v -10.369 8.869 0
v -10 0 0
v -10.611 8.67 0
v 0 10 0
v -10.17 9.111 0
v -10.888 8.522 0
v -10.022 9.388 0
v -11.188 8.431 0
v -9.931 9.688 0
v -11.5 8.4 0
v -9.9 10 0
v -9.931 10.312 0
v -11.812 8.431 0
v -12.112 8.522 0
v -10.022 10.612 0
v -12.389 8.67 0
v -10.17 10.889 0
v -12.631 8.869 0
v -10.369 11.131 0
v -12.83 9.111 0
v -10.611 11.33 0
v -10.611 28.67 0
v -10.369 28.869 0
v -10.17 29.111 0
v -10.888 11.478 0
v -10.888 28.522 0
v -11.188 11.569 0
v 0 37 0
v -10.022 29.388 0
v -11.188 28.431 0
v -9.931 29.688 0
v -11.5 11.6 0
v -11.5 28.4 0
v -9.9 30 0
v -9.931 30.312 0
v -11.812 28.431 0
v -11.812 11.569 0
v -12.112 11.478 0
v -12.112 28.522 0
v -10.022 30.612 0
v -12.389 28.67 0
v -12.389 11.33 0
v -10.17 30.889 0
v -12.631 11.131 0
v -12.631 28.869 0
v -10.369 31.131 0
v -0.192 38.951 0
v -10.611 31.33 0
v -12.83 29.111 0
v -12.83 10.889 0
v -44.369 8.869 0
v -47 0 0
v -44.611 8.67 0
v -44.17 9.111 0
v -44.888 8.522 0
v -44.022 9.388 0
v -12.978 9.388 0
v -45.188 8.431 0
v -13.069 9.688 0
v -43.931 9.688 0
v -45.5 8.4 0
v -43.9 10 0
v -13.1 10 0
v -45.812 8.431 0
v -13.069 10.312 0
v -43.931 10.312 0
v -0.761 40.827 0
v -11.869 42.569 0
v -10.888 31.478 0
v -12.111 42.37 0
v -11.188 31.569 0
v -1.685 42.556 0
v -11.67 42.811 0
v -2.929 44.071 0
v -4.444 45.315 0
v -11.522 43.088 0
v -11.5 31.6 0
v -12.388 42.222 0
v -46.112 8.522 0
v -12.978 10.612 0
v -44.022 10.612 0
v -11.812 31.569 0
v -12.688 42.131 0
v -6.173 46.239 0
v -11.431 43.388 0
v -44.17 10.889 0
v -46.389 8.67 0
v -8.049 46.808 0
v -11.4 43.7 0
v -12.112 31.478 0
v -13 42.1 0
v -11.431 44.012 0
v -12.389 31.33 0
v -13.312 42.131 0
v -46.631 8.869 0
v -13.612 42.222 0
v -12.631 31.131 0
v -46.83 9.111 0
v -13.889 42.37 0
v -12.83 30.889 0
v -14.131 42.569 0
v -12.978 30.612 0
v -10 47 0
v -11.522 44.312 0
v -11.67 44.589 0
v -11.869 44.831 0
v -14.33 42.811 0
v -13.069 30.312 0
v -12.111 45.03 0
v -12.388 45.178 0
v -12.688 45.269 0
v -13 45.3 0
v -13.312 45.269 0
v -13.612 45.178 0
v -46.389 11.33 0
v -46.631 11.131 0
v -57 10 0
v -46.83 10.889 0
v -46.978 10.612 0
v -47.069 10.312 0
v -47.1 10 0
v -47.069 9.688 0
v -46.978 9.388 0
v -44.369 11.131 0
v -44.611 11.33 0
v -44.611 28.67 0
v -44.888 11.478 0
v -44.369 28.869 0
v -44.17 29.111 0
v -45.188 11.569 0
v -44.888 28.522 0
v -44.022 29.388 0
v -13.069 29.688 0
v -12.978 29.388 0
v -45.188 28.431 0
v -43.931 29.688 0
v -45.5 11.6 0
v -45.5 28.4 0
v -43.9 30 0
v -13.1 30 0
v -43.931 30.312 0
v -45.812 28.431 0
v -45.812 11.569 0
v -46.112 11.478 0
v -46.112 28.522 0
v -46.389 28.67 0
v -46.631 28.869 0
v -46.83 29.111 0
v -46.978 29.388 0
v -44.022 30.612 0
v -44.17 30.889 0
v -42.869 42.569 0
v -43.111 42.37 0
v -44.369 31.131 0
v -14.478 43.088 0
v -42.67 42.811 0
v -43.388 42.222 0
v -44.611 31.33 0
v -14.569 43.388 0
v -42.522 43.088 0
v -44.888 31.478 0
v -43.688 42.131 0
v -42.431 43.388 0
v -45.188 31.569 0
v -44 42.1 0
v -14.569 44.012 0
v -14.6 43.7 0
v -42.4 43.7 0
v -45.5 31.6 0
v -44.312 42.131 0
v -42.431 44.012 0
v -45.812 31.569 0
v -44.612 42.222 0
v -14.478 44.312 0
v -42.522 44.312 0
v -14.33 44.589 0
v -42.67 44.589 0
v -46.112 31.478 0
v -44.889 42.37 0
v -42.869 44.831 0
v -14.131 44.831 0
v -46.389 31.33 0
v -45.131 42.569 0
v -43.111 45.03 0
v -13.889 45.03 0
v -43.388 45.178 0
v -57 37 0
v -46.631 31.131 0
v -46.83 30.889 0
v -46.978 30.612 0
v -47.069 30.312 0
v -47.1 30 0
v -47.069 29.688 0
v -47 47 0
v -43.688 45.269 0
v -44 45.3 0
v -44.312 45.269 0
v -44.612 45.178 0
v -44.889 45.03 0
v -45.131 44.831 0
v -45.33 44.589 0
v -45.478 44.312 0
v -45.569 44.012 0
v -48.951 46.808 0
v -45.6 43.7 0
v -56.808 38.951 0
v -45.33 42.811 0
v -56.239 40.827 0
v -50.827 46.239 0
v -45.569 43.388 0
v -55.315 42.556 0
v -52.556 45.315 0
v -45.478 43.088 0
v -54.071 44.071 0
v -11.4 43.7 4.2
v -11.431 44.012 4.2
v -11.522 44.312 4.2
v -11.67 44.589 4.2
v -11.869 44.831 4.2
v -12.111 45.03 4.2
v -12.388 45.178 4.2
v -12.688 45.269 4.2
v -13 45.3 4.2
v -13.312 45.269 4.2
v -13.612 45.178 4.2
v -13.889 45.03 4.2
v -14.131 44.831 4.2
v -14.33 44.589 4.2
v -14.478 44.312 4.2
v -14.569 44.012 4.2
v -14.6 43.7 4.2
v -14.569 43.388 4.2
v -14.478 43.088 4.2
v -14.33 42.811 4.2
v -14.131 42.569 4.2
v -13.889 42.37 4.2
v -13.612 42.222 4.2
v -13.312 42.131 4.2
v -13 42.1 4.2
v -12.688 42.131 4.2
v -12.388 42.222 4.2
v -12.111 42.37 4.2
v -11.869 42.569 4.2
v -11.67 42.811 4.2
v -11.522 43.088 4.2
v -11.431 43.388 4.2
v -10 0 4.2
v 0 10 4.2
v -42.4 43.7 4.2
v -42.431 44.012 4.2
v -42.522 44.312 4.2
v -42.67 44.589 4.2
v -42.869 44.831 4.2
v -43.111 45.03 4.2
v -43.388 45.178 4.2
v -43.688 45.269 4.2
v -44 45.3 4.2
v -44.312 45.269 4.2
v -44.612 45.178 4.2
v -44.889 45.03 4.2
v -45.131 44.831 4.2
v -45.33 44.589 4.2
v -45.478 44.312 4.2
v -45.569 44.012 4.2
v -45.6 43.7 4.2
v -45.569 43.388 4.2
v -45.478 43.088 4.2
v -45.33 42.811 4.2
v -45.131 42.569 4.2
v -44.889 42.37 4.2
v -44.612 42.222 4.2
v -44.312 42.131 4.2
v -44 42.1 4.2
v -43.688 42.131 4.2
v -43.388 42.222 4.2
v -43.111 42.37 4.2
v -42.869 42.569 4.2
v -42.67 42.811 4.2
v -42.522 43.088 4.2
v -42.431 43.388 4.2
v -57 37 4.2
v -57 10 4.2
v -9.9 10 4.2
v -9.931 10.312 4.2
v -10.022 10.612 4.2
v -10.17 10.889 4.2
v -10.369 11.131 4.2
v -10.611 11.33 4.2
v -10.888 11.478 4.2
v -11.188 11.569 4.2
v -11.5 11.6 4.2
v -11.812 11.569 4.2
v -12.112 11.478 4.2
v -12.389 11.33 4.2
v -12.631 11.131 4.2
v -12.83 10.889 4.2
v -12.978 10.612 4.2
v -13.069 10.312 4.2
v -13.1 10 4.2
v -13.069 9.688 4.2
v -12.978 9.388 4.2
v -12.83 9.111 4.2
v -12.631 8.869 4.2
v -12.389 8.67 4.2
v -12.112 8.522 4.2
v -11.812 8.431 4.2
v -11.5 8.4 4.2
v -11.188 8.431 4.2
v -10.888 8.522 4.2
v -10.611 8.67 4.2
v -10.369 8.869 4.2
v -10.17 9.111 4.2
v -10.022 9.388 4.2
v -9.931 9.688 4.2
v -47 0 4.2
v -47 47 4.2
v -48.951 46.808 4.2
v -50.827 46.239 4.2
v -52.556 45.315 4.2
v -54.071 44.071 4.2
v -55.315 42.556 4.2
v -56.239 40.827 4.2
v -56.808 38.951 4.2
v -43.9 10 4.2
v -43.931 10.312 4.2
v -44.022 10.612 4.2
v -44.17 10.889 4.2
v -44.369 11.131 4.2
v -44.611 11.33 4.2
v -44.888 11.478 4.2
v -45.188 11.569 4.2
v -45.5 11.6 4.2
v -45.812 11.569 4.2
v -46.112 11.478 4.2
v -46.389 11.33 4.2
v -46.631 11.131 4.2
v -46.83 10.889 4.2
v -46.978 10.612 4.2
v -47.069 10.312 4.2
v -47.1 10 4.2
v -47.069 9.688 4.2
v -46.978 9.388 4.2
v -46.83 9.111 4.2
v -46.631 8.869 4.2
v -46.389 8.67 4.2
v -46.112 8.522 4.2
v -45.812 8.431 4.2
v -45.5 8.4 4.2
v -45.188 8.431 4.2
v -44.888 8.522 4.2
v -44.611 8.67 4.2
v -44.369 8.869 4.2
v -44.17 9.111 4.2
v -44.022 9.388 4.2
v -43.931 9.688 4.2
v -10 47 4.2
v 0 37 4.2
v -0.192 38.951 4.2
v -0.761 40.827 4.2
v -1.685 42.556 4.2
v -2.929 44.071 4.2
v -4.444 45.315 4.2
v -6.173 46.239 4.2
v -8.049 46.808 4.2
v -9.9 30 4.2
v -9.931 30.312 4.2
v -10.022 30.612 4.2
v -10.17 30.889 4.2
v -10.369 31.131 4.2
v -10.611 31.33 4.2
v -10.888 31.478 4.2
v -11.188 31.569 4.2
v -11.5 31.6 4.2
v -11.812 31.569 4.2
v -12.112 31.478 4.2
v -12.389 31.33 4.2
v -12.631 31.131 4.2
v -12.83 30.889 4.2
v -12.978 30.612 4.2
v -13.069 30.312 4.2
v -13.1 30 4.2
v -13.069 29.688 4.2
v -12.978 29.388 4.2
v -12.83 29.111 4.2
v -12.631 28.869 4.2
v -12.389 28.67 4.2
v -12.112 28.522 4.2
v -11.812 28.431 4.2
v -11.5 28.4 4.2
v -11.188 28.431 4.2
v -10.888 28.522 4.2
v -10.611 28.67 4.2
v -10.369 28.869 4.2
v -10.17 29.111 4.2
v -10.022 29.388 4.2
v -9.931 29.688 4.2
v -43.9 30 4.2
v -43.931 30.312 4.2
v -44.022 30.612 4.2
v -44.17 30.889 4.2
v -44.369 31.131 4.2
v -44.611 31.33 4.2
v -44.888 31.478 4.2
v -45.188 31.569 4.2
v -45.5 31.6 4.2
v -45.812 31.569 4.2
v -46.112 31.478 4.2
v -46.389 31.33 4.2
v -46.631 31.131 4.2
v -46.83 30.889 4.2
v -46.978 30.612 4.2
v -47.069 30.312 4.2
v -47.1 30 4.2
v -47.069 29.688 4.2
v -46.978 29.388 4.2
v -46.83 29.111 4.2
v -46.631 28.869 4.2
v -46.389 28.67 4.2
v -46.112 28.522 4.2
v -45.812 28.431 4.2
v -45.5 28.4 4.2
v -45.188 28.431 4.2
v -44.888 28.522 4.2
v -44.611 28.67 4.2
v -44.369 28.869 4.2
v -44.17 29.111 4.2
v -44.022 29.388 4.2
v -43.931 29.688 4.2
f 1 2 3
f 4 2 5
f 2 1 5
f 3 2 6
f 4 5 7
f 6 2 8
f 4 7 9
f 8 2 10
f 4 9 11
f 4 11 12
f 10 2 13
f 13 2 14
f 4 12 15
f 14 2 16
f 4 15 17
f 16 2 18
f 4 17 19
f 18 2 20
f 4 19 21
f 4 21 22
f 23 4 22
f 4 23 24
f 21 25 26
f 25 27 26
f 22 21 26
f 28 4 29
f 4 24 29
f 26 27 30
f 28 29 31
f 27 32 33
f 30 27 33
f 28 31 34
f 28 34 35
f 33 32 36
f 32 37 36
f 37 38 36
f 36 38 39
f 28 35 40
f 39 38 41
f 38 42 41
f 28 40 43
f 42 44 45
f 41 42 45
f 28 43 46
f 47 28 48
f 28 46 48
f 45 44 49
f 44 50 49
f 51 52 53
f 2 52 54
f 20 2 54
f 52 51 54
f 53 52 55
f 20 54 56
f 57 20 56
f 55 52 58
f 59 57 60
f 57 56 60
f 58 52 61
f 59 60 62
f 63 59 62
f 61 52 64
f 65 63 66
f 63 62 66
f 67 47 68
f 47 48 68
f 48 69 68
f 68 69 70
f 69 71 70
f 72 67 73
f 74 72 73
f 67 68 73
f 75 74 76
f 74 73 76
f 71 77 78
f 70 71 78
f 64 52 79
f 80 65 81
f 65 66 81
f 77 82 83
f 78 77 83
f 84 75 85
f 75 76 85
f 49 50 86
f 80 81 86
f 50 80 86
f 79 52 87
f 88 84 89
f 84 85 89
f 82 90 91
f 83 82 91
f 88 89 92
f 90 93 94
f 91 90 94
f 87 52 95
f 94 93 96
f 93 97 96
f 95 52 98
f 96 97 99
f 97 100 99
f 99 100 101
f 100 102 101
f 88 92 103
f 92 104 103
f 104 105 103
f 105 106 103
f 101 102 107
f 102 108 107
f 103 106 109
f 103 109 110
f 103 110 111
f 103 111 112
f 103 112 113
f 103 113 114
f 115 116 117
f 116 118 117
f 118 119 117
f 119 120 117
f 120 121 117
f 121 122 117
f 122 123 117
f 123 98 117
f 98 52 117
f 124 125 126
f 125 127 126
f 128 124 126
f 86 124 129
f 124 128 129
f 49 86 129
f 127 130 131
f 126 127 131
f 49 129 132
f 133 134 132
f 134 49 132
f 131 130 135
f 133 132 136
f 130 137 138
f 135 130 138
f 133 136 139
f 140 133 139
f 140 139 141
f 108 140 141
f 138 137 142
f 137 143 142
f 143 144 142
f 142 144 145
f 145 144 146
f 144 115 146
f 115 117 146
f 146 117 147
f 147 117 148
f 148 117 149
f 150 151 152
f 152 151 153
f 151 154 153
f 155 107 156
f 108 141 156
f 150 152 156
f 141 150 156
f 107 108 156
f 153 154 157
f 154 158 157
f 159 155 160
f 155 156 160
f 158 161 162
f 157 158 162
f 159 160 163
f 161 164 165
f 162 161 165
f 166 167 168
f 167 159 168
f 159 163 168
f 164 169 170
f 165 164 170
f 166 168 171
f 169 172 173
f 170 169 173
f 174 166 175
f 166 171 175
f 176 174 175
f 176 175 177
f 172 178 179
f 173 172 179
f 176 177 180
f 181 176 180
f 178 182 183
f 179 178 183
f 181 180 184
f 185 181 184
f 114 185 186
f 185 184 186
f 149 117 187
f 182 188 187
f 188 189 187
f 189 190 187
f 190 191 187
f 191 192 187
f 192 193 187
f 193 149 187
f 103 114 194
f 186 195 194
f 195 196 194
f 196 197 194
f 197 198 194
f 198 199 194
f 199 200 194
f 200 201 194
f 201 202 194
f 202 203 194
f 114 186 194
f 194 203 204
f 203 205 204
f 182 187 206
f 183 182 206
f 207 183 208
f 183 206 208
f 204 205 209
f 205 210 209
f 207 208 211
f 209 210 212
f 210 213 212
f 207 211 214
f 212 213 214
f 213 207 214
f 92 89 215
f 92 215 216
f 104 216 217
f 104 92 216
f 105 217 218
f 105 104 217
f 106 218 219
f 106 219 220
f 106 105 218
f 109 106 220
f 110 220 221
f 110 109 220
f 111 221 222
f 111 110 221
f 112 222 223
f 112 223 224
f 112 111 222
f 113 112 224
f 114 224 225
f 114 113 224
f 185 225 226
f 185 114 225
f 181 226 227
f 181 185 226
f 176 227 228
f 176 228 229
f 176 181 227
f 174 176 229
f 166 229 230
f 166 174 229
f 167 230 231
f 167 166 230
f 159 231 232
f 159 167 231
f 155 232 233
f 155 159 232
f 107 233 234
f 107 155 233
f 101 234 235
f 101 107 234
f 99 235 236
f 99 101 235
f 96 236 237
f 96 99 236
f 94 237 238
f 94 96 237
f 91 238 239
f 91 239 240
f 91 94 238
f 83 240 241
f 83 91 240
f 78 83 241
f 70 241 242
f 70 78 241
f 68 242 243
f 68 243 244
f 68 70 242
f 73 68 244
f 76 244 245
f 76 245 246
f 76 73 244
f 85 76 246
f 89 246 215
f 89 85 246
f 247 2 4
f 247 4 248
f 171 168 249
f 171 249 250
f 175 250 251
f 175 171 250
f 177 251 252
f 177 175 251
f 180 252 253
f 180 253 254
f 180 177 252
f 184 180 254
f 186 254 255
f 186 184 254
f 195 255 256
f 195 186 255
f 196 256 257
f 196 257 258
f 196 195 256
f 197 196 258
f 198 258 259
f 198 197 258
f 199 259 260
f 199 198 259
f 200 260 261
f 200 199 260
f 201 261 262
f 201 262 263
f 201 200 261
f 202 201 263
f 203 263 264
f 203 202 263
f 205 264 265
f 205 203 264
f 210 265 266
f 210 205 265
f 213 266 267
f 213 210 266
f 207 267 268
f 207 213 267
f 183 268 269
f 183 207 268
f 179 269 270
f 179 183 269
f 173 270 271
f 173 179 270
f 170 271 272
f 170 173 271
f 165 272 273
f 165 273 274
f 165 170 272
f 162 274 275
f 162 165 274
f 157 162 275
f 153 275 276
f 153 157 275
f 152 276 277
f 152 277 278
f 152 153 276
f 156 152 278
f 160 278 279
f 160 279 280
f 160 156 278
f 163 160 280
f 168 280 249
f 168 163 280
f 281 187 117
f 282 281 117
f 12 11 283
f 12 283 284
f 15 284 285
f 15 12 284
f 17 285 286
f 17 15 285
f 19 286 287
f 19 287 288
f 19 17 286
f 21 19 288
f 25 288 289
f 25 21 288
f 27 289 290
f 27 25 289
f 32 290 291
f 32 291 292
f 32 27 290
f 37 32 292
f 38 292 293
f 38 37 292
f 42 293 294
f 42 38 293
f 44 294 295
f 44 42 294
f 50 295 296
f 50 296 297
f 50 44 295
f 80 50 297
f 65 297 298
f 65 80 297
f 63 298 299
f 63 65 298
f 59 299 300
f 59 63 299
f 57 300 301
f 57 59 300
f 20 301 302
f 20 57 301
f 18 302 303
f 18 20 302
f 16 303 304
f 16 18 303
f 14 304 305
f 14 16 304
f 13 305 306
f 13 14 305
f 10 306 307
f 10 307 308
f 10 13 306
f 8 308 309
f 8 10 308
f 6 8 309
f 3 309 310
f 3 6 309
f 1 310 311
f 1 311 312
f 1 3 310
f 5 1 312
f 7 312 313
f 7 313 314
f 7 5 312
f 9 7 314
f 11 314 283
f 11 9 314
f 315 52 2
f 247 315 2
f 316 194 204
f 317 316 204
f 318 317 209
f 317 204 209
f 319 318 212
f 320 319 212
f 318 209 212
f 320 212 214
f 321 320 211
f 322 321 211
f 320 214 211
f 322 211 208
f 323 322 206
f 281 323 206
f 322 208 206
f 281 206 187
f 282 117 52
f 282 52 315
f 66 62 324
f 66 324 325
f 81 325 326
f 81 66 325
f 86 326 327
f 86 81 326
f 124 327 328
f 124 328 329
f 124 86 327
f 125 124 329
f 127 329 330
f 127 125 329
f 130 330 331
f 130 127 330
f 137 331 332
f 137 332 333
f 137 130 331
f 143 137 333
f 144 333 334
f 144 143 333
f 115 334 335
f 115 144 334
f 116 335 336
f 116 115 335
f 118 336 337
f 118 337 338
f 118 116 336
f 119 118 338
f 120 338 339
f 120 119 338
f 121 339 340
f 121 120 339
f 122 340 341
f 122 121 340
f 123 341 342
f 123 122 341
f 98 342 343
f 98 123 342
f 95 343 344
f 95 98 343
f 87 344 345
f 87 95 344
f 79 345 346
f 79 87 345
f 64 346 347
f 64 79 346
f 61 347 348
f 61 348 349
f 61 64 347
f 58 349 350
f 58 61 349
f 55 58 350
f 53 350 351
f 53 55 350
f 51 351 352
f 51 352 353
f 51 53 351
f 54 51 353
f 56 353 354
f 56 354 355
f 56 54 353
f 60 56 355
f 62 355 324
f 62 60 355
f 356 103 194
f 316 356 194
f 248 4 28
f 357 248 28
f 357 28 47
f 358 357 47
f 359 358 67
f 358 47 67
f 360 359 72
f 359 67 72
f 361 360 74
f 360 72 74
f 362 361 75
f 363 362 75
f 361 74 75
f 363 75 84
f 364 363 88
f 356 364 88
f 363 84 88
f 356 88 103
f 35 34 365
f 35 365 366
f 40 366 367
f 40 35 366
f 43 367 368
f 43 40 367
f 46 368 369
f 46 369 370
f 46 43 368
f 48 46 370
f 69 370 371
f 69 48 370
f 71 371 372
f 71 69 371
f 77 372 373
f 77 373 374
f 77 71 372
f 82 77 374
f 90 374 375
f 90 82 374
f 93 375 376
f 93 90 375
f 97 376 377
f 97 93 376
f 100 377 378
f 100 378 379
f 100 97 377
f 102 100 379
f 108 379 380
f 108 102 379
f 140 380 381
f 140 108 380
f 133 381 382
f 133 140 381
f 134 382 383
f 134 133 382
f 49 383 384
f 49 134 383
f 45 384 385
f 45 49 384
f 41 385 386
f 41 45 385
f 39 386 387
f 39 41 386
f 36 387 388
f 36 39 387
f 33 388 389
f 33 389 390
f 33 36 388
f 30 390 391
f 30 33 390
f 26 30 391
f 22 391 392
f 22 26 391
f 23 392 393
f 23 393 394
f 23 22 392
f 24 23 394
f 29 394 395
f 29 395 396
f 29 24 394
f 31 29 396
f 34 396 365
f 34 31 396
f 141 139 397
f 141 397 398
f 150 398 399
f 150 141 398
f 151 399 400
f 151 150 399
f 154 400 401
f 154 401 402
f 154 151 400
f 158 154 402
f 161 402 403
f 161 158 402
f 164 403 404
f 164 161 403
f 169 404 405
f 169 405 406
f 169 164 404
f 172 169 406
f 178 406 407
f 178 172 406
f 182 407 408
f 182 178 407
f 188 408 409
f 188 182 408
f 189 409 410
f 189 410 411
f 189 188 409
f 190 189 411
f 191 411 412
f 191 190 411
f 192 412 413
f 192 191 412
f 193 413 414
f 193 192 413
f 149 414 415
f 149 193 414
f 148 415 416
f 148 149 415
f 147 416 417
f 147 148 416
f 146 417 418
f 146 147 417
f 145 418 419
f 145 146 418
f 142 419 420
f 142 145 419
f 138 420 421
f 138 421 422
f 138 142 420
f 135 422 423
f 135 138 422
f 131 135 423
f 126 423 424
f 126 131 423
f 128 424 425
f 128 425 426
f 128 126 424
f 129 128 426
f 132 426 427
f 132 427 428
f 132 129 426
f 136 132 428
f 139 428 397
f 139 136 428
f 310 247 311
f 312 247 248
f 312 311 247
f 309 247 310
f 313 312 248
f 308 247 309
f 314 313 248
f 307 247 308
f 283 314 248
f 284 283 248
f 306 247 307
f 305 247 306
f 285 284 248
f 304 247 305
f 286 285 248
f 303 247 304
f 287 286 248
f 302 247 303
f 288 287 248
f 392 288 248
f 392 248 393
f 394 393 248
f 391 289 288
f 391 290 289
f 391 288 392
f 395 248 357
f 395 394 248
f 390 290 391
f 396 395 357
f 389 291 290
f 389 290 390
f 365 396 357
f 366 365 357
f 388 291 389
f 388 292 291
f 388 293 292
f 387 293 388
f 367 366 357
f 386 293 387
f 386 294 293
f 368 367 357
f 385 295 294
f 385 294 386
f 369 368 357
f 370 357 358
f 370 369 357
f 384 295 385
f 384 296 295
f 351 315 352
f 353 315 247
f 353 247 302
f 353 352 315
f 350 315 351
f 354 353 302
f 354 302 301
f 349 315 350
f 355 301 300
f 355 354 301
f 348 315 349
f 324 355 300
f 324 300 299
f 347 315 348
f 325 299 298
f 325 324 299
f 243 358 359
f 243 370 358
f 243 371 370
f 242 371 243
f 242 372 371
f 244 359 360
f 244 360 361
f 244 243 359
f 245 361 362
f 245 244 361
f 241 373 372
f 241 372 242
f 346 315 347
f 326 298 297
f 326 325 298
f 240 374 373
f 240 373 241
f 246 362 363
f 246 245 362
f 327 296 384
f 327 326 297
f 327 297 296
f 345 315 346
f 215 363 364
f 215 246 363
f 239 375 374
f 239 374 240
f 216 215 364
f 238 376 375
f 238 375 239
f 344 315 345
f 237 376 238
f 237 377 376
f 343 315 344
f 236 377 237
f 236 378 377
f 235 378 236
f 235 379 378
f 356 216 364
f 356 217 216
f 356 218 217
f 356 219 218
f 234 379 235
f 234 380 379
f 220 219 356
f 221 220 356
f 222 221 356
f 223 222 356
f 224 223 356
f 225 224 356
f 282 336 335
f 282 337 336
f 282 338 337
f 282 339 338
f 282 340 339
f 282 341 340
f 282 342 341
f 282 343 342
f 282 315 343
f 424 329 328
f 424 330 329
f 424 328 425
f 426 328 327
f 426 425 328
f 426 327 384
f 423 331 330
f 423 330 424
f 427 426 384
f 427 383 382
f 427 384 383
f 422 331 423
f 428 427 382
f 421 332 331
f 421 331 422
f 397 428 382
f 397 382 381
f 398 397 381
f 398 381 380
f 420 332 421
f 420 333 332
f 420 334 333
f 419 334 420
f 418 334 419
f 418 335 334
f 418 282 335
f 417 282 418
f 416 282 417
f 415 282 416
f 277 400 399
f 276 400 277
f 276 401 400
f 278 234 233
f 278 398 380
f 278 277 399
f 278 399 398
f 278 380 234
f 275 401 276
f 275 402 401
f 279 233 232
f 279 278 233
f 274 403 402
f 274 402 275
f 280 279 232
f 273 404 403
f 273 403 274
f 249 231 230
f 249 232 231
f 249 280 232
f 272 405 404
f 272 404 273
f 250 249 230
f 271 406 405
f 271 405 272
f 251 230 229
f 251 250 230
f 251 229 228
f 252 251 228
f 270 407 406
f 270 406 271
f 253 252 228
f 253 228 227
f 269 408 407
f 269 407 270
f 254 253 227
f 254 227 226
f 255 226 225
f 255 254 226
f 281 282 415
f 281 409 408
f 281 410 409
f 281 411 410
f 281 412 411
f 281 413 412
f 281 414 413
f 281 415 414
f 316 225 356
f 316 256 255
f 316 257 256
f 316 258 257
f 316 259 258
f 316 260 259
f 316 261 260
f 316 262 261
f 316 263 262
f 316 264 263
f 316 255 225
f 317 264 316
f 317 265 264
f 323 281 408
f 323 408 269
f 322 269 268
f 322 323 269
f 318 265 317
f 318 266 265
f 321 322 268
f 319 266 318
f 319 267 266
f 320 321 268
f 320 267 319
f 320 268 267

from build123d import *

# Parameters (mm, degrees)
SKETCH2_R           = 1.6
BOSS_EXTRUDE1_DEPTH = 4.2
CHAMFER1_SIZE       = 10


with BuildPart() as part:
    # Sketch2 → Boss-Extrude1 (new body)
    with BuildSketch(Plane(origin=(0, 0, 0), x_dir=(0, 1, 0), z_dir=(0, 0, 1))):
        with BuildLine():
            Line((0, 0), (37, 0))
            ThreePointArc((37, 0), (44.071067812, 2.928932188), (47, 10))
            Line((47, 10), (47, 47))
            ThreePointArc((47, 47), (44.071067812, 54.071067812), (37, 57))
            Line((37, 57), (0, 57))
            Line((0, 57), (0, 0))
        make_face()
        with Locations(Location((43.7, 44, 0), (0, 0, 270))):
            Circle(SKETCH2_R, mode=Mode.SUBTRACT)
        with Locations(Location((43.7, 13, 0), (0, 0, 270))):
            Circle(SKETCH2_R, mode=Mode.SUBTRACT)
        with Locations(Location((10, 45.5, 0), (0, 0, 270))):
            Circle(SKETCH2_R, mode=Mode.SUBTRACT)
        with Locations(Location((10, 11.5, 0), (0, 0, 270))):
            Circle(SKETCH2_R, mode=Mode.SUBTRACT)
        with Locations(Location((30, 45.5, 0), (0, 0, 270))):
            Circle(SKETCH2_R, mode=Mode.SUBTRACT)
        with Locations(Location((30, 11.5, 0), (0, 0, 270))):
            Circle(SKETCH2_R, mode=Mode.SUBTRACT)
    extrude(amount=BOSS_EXTRUDE1_DEPTH)

    # Chamfer1
    chamfer1_edges = [part.edges().sort_by_distance(p)[0] for p in [
        (-57, 0, 2.1),
        (0, 0, 2.1),
    ]]
    chamfer(chamfer1_edges, length=CHAMFER1_SIZE)


solid = part.part
